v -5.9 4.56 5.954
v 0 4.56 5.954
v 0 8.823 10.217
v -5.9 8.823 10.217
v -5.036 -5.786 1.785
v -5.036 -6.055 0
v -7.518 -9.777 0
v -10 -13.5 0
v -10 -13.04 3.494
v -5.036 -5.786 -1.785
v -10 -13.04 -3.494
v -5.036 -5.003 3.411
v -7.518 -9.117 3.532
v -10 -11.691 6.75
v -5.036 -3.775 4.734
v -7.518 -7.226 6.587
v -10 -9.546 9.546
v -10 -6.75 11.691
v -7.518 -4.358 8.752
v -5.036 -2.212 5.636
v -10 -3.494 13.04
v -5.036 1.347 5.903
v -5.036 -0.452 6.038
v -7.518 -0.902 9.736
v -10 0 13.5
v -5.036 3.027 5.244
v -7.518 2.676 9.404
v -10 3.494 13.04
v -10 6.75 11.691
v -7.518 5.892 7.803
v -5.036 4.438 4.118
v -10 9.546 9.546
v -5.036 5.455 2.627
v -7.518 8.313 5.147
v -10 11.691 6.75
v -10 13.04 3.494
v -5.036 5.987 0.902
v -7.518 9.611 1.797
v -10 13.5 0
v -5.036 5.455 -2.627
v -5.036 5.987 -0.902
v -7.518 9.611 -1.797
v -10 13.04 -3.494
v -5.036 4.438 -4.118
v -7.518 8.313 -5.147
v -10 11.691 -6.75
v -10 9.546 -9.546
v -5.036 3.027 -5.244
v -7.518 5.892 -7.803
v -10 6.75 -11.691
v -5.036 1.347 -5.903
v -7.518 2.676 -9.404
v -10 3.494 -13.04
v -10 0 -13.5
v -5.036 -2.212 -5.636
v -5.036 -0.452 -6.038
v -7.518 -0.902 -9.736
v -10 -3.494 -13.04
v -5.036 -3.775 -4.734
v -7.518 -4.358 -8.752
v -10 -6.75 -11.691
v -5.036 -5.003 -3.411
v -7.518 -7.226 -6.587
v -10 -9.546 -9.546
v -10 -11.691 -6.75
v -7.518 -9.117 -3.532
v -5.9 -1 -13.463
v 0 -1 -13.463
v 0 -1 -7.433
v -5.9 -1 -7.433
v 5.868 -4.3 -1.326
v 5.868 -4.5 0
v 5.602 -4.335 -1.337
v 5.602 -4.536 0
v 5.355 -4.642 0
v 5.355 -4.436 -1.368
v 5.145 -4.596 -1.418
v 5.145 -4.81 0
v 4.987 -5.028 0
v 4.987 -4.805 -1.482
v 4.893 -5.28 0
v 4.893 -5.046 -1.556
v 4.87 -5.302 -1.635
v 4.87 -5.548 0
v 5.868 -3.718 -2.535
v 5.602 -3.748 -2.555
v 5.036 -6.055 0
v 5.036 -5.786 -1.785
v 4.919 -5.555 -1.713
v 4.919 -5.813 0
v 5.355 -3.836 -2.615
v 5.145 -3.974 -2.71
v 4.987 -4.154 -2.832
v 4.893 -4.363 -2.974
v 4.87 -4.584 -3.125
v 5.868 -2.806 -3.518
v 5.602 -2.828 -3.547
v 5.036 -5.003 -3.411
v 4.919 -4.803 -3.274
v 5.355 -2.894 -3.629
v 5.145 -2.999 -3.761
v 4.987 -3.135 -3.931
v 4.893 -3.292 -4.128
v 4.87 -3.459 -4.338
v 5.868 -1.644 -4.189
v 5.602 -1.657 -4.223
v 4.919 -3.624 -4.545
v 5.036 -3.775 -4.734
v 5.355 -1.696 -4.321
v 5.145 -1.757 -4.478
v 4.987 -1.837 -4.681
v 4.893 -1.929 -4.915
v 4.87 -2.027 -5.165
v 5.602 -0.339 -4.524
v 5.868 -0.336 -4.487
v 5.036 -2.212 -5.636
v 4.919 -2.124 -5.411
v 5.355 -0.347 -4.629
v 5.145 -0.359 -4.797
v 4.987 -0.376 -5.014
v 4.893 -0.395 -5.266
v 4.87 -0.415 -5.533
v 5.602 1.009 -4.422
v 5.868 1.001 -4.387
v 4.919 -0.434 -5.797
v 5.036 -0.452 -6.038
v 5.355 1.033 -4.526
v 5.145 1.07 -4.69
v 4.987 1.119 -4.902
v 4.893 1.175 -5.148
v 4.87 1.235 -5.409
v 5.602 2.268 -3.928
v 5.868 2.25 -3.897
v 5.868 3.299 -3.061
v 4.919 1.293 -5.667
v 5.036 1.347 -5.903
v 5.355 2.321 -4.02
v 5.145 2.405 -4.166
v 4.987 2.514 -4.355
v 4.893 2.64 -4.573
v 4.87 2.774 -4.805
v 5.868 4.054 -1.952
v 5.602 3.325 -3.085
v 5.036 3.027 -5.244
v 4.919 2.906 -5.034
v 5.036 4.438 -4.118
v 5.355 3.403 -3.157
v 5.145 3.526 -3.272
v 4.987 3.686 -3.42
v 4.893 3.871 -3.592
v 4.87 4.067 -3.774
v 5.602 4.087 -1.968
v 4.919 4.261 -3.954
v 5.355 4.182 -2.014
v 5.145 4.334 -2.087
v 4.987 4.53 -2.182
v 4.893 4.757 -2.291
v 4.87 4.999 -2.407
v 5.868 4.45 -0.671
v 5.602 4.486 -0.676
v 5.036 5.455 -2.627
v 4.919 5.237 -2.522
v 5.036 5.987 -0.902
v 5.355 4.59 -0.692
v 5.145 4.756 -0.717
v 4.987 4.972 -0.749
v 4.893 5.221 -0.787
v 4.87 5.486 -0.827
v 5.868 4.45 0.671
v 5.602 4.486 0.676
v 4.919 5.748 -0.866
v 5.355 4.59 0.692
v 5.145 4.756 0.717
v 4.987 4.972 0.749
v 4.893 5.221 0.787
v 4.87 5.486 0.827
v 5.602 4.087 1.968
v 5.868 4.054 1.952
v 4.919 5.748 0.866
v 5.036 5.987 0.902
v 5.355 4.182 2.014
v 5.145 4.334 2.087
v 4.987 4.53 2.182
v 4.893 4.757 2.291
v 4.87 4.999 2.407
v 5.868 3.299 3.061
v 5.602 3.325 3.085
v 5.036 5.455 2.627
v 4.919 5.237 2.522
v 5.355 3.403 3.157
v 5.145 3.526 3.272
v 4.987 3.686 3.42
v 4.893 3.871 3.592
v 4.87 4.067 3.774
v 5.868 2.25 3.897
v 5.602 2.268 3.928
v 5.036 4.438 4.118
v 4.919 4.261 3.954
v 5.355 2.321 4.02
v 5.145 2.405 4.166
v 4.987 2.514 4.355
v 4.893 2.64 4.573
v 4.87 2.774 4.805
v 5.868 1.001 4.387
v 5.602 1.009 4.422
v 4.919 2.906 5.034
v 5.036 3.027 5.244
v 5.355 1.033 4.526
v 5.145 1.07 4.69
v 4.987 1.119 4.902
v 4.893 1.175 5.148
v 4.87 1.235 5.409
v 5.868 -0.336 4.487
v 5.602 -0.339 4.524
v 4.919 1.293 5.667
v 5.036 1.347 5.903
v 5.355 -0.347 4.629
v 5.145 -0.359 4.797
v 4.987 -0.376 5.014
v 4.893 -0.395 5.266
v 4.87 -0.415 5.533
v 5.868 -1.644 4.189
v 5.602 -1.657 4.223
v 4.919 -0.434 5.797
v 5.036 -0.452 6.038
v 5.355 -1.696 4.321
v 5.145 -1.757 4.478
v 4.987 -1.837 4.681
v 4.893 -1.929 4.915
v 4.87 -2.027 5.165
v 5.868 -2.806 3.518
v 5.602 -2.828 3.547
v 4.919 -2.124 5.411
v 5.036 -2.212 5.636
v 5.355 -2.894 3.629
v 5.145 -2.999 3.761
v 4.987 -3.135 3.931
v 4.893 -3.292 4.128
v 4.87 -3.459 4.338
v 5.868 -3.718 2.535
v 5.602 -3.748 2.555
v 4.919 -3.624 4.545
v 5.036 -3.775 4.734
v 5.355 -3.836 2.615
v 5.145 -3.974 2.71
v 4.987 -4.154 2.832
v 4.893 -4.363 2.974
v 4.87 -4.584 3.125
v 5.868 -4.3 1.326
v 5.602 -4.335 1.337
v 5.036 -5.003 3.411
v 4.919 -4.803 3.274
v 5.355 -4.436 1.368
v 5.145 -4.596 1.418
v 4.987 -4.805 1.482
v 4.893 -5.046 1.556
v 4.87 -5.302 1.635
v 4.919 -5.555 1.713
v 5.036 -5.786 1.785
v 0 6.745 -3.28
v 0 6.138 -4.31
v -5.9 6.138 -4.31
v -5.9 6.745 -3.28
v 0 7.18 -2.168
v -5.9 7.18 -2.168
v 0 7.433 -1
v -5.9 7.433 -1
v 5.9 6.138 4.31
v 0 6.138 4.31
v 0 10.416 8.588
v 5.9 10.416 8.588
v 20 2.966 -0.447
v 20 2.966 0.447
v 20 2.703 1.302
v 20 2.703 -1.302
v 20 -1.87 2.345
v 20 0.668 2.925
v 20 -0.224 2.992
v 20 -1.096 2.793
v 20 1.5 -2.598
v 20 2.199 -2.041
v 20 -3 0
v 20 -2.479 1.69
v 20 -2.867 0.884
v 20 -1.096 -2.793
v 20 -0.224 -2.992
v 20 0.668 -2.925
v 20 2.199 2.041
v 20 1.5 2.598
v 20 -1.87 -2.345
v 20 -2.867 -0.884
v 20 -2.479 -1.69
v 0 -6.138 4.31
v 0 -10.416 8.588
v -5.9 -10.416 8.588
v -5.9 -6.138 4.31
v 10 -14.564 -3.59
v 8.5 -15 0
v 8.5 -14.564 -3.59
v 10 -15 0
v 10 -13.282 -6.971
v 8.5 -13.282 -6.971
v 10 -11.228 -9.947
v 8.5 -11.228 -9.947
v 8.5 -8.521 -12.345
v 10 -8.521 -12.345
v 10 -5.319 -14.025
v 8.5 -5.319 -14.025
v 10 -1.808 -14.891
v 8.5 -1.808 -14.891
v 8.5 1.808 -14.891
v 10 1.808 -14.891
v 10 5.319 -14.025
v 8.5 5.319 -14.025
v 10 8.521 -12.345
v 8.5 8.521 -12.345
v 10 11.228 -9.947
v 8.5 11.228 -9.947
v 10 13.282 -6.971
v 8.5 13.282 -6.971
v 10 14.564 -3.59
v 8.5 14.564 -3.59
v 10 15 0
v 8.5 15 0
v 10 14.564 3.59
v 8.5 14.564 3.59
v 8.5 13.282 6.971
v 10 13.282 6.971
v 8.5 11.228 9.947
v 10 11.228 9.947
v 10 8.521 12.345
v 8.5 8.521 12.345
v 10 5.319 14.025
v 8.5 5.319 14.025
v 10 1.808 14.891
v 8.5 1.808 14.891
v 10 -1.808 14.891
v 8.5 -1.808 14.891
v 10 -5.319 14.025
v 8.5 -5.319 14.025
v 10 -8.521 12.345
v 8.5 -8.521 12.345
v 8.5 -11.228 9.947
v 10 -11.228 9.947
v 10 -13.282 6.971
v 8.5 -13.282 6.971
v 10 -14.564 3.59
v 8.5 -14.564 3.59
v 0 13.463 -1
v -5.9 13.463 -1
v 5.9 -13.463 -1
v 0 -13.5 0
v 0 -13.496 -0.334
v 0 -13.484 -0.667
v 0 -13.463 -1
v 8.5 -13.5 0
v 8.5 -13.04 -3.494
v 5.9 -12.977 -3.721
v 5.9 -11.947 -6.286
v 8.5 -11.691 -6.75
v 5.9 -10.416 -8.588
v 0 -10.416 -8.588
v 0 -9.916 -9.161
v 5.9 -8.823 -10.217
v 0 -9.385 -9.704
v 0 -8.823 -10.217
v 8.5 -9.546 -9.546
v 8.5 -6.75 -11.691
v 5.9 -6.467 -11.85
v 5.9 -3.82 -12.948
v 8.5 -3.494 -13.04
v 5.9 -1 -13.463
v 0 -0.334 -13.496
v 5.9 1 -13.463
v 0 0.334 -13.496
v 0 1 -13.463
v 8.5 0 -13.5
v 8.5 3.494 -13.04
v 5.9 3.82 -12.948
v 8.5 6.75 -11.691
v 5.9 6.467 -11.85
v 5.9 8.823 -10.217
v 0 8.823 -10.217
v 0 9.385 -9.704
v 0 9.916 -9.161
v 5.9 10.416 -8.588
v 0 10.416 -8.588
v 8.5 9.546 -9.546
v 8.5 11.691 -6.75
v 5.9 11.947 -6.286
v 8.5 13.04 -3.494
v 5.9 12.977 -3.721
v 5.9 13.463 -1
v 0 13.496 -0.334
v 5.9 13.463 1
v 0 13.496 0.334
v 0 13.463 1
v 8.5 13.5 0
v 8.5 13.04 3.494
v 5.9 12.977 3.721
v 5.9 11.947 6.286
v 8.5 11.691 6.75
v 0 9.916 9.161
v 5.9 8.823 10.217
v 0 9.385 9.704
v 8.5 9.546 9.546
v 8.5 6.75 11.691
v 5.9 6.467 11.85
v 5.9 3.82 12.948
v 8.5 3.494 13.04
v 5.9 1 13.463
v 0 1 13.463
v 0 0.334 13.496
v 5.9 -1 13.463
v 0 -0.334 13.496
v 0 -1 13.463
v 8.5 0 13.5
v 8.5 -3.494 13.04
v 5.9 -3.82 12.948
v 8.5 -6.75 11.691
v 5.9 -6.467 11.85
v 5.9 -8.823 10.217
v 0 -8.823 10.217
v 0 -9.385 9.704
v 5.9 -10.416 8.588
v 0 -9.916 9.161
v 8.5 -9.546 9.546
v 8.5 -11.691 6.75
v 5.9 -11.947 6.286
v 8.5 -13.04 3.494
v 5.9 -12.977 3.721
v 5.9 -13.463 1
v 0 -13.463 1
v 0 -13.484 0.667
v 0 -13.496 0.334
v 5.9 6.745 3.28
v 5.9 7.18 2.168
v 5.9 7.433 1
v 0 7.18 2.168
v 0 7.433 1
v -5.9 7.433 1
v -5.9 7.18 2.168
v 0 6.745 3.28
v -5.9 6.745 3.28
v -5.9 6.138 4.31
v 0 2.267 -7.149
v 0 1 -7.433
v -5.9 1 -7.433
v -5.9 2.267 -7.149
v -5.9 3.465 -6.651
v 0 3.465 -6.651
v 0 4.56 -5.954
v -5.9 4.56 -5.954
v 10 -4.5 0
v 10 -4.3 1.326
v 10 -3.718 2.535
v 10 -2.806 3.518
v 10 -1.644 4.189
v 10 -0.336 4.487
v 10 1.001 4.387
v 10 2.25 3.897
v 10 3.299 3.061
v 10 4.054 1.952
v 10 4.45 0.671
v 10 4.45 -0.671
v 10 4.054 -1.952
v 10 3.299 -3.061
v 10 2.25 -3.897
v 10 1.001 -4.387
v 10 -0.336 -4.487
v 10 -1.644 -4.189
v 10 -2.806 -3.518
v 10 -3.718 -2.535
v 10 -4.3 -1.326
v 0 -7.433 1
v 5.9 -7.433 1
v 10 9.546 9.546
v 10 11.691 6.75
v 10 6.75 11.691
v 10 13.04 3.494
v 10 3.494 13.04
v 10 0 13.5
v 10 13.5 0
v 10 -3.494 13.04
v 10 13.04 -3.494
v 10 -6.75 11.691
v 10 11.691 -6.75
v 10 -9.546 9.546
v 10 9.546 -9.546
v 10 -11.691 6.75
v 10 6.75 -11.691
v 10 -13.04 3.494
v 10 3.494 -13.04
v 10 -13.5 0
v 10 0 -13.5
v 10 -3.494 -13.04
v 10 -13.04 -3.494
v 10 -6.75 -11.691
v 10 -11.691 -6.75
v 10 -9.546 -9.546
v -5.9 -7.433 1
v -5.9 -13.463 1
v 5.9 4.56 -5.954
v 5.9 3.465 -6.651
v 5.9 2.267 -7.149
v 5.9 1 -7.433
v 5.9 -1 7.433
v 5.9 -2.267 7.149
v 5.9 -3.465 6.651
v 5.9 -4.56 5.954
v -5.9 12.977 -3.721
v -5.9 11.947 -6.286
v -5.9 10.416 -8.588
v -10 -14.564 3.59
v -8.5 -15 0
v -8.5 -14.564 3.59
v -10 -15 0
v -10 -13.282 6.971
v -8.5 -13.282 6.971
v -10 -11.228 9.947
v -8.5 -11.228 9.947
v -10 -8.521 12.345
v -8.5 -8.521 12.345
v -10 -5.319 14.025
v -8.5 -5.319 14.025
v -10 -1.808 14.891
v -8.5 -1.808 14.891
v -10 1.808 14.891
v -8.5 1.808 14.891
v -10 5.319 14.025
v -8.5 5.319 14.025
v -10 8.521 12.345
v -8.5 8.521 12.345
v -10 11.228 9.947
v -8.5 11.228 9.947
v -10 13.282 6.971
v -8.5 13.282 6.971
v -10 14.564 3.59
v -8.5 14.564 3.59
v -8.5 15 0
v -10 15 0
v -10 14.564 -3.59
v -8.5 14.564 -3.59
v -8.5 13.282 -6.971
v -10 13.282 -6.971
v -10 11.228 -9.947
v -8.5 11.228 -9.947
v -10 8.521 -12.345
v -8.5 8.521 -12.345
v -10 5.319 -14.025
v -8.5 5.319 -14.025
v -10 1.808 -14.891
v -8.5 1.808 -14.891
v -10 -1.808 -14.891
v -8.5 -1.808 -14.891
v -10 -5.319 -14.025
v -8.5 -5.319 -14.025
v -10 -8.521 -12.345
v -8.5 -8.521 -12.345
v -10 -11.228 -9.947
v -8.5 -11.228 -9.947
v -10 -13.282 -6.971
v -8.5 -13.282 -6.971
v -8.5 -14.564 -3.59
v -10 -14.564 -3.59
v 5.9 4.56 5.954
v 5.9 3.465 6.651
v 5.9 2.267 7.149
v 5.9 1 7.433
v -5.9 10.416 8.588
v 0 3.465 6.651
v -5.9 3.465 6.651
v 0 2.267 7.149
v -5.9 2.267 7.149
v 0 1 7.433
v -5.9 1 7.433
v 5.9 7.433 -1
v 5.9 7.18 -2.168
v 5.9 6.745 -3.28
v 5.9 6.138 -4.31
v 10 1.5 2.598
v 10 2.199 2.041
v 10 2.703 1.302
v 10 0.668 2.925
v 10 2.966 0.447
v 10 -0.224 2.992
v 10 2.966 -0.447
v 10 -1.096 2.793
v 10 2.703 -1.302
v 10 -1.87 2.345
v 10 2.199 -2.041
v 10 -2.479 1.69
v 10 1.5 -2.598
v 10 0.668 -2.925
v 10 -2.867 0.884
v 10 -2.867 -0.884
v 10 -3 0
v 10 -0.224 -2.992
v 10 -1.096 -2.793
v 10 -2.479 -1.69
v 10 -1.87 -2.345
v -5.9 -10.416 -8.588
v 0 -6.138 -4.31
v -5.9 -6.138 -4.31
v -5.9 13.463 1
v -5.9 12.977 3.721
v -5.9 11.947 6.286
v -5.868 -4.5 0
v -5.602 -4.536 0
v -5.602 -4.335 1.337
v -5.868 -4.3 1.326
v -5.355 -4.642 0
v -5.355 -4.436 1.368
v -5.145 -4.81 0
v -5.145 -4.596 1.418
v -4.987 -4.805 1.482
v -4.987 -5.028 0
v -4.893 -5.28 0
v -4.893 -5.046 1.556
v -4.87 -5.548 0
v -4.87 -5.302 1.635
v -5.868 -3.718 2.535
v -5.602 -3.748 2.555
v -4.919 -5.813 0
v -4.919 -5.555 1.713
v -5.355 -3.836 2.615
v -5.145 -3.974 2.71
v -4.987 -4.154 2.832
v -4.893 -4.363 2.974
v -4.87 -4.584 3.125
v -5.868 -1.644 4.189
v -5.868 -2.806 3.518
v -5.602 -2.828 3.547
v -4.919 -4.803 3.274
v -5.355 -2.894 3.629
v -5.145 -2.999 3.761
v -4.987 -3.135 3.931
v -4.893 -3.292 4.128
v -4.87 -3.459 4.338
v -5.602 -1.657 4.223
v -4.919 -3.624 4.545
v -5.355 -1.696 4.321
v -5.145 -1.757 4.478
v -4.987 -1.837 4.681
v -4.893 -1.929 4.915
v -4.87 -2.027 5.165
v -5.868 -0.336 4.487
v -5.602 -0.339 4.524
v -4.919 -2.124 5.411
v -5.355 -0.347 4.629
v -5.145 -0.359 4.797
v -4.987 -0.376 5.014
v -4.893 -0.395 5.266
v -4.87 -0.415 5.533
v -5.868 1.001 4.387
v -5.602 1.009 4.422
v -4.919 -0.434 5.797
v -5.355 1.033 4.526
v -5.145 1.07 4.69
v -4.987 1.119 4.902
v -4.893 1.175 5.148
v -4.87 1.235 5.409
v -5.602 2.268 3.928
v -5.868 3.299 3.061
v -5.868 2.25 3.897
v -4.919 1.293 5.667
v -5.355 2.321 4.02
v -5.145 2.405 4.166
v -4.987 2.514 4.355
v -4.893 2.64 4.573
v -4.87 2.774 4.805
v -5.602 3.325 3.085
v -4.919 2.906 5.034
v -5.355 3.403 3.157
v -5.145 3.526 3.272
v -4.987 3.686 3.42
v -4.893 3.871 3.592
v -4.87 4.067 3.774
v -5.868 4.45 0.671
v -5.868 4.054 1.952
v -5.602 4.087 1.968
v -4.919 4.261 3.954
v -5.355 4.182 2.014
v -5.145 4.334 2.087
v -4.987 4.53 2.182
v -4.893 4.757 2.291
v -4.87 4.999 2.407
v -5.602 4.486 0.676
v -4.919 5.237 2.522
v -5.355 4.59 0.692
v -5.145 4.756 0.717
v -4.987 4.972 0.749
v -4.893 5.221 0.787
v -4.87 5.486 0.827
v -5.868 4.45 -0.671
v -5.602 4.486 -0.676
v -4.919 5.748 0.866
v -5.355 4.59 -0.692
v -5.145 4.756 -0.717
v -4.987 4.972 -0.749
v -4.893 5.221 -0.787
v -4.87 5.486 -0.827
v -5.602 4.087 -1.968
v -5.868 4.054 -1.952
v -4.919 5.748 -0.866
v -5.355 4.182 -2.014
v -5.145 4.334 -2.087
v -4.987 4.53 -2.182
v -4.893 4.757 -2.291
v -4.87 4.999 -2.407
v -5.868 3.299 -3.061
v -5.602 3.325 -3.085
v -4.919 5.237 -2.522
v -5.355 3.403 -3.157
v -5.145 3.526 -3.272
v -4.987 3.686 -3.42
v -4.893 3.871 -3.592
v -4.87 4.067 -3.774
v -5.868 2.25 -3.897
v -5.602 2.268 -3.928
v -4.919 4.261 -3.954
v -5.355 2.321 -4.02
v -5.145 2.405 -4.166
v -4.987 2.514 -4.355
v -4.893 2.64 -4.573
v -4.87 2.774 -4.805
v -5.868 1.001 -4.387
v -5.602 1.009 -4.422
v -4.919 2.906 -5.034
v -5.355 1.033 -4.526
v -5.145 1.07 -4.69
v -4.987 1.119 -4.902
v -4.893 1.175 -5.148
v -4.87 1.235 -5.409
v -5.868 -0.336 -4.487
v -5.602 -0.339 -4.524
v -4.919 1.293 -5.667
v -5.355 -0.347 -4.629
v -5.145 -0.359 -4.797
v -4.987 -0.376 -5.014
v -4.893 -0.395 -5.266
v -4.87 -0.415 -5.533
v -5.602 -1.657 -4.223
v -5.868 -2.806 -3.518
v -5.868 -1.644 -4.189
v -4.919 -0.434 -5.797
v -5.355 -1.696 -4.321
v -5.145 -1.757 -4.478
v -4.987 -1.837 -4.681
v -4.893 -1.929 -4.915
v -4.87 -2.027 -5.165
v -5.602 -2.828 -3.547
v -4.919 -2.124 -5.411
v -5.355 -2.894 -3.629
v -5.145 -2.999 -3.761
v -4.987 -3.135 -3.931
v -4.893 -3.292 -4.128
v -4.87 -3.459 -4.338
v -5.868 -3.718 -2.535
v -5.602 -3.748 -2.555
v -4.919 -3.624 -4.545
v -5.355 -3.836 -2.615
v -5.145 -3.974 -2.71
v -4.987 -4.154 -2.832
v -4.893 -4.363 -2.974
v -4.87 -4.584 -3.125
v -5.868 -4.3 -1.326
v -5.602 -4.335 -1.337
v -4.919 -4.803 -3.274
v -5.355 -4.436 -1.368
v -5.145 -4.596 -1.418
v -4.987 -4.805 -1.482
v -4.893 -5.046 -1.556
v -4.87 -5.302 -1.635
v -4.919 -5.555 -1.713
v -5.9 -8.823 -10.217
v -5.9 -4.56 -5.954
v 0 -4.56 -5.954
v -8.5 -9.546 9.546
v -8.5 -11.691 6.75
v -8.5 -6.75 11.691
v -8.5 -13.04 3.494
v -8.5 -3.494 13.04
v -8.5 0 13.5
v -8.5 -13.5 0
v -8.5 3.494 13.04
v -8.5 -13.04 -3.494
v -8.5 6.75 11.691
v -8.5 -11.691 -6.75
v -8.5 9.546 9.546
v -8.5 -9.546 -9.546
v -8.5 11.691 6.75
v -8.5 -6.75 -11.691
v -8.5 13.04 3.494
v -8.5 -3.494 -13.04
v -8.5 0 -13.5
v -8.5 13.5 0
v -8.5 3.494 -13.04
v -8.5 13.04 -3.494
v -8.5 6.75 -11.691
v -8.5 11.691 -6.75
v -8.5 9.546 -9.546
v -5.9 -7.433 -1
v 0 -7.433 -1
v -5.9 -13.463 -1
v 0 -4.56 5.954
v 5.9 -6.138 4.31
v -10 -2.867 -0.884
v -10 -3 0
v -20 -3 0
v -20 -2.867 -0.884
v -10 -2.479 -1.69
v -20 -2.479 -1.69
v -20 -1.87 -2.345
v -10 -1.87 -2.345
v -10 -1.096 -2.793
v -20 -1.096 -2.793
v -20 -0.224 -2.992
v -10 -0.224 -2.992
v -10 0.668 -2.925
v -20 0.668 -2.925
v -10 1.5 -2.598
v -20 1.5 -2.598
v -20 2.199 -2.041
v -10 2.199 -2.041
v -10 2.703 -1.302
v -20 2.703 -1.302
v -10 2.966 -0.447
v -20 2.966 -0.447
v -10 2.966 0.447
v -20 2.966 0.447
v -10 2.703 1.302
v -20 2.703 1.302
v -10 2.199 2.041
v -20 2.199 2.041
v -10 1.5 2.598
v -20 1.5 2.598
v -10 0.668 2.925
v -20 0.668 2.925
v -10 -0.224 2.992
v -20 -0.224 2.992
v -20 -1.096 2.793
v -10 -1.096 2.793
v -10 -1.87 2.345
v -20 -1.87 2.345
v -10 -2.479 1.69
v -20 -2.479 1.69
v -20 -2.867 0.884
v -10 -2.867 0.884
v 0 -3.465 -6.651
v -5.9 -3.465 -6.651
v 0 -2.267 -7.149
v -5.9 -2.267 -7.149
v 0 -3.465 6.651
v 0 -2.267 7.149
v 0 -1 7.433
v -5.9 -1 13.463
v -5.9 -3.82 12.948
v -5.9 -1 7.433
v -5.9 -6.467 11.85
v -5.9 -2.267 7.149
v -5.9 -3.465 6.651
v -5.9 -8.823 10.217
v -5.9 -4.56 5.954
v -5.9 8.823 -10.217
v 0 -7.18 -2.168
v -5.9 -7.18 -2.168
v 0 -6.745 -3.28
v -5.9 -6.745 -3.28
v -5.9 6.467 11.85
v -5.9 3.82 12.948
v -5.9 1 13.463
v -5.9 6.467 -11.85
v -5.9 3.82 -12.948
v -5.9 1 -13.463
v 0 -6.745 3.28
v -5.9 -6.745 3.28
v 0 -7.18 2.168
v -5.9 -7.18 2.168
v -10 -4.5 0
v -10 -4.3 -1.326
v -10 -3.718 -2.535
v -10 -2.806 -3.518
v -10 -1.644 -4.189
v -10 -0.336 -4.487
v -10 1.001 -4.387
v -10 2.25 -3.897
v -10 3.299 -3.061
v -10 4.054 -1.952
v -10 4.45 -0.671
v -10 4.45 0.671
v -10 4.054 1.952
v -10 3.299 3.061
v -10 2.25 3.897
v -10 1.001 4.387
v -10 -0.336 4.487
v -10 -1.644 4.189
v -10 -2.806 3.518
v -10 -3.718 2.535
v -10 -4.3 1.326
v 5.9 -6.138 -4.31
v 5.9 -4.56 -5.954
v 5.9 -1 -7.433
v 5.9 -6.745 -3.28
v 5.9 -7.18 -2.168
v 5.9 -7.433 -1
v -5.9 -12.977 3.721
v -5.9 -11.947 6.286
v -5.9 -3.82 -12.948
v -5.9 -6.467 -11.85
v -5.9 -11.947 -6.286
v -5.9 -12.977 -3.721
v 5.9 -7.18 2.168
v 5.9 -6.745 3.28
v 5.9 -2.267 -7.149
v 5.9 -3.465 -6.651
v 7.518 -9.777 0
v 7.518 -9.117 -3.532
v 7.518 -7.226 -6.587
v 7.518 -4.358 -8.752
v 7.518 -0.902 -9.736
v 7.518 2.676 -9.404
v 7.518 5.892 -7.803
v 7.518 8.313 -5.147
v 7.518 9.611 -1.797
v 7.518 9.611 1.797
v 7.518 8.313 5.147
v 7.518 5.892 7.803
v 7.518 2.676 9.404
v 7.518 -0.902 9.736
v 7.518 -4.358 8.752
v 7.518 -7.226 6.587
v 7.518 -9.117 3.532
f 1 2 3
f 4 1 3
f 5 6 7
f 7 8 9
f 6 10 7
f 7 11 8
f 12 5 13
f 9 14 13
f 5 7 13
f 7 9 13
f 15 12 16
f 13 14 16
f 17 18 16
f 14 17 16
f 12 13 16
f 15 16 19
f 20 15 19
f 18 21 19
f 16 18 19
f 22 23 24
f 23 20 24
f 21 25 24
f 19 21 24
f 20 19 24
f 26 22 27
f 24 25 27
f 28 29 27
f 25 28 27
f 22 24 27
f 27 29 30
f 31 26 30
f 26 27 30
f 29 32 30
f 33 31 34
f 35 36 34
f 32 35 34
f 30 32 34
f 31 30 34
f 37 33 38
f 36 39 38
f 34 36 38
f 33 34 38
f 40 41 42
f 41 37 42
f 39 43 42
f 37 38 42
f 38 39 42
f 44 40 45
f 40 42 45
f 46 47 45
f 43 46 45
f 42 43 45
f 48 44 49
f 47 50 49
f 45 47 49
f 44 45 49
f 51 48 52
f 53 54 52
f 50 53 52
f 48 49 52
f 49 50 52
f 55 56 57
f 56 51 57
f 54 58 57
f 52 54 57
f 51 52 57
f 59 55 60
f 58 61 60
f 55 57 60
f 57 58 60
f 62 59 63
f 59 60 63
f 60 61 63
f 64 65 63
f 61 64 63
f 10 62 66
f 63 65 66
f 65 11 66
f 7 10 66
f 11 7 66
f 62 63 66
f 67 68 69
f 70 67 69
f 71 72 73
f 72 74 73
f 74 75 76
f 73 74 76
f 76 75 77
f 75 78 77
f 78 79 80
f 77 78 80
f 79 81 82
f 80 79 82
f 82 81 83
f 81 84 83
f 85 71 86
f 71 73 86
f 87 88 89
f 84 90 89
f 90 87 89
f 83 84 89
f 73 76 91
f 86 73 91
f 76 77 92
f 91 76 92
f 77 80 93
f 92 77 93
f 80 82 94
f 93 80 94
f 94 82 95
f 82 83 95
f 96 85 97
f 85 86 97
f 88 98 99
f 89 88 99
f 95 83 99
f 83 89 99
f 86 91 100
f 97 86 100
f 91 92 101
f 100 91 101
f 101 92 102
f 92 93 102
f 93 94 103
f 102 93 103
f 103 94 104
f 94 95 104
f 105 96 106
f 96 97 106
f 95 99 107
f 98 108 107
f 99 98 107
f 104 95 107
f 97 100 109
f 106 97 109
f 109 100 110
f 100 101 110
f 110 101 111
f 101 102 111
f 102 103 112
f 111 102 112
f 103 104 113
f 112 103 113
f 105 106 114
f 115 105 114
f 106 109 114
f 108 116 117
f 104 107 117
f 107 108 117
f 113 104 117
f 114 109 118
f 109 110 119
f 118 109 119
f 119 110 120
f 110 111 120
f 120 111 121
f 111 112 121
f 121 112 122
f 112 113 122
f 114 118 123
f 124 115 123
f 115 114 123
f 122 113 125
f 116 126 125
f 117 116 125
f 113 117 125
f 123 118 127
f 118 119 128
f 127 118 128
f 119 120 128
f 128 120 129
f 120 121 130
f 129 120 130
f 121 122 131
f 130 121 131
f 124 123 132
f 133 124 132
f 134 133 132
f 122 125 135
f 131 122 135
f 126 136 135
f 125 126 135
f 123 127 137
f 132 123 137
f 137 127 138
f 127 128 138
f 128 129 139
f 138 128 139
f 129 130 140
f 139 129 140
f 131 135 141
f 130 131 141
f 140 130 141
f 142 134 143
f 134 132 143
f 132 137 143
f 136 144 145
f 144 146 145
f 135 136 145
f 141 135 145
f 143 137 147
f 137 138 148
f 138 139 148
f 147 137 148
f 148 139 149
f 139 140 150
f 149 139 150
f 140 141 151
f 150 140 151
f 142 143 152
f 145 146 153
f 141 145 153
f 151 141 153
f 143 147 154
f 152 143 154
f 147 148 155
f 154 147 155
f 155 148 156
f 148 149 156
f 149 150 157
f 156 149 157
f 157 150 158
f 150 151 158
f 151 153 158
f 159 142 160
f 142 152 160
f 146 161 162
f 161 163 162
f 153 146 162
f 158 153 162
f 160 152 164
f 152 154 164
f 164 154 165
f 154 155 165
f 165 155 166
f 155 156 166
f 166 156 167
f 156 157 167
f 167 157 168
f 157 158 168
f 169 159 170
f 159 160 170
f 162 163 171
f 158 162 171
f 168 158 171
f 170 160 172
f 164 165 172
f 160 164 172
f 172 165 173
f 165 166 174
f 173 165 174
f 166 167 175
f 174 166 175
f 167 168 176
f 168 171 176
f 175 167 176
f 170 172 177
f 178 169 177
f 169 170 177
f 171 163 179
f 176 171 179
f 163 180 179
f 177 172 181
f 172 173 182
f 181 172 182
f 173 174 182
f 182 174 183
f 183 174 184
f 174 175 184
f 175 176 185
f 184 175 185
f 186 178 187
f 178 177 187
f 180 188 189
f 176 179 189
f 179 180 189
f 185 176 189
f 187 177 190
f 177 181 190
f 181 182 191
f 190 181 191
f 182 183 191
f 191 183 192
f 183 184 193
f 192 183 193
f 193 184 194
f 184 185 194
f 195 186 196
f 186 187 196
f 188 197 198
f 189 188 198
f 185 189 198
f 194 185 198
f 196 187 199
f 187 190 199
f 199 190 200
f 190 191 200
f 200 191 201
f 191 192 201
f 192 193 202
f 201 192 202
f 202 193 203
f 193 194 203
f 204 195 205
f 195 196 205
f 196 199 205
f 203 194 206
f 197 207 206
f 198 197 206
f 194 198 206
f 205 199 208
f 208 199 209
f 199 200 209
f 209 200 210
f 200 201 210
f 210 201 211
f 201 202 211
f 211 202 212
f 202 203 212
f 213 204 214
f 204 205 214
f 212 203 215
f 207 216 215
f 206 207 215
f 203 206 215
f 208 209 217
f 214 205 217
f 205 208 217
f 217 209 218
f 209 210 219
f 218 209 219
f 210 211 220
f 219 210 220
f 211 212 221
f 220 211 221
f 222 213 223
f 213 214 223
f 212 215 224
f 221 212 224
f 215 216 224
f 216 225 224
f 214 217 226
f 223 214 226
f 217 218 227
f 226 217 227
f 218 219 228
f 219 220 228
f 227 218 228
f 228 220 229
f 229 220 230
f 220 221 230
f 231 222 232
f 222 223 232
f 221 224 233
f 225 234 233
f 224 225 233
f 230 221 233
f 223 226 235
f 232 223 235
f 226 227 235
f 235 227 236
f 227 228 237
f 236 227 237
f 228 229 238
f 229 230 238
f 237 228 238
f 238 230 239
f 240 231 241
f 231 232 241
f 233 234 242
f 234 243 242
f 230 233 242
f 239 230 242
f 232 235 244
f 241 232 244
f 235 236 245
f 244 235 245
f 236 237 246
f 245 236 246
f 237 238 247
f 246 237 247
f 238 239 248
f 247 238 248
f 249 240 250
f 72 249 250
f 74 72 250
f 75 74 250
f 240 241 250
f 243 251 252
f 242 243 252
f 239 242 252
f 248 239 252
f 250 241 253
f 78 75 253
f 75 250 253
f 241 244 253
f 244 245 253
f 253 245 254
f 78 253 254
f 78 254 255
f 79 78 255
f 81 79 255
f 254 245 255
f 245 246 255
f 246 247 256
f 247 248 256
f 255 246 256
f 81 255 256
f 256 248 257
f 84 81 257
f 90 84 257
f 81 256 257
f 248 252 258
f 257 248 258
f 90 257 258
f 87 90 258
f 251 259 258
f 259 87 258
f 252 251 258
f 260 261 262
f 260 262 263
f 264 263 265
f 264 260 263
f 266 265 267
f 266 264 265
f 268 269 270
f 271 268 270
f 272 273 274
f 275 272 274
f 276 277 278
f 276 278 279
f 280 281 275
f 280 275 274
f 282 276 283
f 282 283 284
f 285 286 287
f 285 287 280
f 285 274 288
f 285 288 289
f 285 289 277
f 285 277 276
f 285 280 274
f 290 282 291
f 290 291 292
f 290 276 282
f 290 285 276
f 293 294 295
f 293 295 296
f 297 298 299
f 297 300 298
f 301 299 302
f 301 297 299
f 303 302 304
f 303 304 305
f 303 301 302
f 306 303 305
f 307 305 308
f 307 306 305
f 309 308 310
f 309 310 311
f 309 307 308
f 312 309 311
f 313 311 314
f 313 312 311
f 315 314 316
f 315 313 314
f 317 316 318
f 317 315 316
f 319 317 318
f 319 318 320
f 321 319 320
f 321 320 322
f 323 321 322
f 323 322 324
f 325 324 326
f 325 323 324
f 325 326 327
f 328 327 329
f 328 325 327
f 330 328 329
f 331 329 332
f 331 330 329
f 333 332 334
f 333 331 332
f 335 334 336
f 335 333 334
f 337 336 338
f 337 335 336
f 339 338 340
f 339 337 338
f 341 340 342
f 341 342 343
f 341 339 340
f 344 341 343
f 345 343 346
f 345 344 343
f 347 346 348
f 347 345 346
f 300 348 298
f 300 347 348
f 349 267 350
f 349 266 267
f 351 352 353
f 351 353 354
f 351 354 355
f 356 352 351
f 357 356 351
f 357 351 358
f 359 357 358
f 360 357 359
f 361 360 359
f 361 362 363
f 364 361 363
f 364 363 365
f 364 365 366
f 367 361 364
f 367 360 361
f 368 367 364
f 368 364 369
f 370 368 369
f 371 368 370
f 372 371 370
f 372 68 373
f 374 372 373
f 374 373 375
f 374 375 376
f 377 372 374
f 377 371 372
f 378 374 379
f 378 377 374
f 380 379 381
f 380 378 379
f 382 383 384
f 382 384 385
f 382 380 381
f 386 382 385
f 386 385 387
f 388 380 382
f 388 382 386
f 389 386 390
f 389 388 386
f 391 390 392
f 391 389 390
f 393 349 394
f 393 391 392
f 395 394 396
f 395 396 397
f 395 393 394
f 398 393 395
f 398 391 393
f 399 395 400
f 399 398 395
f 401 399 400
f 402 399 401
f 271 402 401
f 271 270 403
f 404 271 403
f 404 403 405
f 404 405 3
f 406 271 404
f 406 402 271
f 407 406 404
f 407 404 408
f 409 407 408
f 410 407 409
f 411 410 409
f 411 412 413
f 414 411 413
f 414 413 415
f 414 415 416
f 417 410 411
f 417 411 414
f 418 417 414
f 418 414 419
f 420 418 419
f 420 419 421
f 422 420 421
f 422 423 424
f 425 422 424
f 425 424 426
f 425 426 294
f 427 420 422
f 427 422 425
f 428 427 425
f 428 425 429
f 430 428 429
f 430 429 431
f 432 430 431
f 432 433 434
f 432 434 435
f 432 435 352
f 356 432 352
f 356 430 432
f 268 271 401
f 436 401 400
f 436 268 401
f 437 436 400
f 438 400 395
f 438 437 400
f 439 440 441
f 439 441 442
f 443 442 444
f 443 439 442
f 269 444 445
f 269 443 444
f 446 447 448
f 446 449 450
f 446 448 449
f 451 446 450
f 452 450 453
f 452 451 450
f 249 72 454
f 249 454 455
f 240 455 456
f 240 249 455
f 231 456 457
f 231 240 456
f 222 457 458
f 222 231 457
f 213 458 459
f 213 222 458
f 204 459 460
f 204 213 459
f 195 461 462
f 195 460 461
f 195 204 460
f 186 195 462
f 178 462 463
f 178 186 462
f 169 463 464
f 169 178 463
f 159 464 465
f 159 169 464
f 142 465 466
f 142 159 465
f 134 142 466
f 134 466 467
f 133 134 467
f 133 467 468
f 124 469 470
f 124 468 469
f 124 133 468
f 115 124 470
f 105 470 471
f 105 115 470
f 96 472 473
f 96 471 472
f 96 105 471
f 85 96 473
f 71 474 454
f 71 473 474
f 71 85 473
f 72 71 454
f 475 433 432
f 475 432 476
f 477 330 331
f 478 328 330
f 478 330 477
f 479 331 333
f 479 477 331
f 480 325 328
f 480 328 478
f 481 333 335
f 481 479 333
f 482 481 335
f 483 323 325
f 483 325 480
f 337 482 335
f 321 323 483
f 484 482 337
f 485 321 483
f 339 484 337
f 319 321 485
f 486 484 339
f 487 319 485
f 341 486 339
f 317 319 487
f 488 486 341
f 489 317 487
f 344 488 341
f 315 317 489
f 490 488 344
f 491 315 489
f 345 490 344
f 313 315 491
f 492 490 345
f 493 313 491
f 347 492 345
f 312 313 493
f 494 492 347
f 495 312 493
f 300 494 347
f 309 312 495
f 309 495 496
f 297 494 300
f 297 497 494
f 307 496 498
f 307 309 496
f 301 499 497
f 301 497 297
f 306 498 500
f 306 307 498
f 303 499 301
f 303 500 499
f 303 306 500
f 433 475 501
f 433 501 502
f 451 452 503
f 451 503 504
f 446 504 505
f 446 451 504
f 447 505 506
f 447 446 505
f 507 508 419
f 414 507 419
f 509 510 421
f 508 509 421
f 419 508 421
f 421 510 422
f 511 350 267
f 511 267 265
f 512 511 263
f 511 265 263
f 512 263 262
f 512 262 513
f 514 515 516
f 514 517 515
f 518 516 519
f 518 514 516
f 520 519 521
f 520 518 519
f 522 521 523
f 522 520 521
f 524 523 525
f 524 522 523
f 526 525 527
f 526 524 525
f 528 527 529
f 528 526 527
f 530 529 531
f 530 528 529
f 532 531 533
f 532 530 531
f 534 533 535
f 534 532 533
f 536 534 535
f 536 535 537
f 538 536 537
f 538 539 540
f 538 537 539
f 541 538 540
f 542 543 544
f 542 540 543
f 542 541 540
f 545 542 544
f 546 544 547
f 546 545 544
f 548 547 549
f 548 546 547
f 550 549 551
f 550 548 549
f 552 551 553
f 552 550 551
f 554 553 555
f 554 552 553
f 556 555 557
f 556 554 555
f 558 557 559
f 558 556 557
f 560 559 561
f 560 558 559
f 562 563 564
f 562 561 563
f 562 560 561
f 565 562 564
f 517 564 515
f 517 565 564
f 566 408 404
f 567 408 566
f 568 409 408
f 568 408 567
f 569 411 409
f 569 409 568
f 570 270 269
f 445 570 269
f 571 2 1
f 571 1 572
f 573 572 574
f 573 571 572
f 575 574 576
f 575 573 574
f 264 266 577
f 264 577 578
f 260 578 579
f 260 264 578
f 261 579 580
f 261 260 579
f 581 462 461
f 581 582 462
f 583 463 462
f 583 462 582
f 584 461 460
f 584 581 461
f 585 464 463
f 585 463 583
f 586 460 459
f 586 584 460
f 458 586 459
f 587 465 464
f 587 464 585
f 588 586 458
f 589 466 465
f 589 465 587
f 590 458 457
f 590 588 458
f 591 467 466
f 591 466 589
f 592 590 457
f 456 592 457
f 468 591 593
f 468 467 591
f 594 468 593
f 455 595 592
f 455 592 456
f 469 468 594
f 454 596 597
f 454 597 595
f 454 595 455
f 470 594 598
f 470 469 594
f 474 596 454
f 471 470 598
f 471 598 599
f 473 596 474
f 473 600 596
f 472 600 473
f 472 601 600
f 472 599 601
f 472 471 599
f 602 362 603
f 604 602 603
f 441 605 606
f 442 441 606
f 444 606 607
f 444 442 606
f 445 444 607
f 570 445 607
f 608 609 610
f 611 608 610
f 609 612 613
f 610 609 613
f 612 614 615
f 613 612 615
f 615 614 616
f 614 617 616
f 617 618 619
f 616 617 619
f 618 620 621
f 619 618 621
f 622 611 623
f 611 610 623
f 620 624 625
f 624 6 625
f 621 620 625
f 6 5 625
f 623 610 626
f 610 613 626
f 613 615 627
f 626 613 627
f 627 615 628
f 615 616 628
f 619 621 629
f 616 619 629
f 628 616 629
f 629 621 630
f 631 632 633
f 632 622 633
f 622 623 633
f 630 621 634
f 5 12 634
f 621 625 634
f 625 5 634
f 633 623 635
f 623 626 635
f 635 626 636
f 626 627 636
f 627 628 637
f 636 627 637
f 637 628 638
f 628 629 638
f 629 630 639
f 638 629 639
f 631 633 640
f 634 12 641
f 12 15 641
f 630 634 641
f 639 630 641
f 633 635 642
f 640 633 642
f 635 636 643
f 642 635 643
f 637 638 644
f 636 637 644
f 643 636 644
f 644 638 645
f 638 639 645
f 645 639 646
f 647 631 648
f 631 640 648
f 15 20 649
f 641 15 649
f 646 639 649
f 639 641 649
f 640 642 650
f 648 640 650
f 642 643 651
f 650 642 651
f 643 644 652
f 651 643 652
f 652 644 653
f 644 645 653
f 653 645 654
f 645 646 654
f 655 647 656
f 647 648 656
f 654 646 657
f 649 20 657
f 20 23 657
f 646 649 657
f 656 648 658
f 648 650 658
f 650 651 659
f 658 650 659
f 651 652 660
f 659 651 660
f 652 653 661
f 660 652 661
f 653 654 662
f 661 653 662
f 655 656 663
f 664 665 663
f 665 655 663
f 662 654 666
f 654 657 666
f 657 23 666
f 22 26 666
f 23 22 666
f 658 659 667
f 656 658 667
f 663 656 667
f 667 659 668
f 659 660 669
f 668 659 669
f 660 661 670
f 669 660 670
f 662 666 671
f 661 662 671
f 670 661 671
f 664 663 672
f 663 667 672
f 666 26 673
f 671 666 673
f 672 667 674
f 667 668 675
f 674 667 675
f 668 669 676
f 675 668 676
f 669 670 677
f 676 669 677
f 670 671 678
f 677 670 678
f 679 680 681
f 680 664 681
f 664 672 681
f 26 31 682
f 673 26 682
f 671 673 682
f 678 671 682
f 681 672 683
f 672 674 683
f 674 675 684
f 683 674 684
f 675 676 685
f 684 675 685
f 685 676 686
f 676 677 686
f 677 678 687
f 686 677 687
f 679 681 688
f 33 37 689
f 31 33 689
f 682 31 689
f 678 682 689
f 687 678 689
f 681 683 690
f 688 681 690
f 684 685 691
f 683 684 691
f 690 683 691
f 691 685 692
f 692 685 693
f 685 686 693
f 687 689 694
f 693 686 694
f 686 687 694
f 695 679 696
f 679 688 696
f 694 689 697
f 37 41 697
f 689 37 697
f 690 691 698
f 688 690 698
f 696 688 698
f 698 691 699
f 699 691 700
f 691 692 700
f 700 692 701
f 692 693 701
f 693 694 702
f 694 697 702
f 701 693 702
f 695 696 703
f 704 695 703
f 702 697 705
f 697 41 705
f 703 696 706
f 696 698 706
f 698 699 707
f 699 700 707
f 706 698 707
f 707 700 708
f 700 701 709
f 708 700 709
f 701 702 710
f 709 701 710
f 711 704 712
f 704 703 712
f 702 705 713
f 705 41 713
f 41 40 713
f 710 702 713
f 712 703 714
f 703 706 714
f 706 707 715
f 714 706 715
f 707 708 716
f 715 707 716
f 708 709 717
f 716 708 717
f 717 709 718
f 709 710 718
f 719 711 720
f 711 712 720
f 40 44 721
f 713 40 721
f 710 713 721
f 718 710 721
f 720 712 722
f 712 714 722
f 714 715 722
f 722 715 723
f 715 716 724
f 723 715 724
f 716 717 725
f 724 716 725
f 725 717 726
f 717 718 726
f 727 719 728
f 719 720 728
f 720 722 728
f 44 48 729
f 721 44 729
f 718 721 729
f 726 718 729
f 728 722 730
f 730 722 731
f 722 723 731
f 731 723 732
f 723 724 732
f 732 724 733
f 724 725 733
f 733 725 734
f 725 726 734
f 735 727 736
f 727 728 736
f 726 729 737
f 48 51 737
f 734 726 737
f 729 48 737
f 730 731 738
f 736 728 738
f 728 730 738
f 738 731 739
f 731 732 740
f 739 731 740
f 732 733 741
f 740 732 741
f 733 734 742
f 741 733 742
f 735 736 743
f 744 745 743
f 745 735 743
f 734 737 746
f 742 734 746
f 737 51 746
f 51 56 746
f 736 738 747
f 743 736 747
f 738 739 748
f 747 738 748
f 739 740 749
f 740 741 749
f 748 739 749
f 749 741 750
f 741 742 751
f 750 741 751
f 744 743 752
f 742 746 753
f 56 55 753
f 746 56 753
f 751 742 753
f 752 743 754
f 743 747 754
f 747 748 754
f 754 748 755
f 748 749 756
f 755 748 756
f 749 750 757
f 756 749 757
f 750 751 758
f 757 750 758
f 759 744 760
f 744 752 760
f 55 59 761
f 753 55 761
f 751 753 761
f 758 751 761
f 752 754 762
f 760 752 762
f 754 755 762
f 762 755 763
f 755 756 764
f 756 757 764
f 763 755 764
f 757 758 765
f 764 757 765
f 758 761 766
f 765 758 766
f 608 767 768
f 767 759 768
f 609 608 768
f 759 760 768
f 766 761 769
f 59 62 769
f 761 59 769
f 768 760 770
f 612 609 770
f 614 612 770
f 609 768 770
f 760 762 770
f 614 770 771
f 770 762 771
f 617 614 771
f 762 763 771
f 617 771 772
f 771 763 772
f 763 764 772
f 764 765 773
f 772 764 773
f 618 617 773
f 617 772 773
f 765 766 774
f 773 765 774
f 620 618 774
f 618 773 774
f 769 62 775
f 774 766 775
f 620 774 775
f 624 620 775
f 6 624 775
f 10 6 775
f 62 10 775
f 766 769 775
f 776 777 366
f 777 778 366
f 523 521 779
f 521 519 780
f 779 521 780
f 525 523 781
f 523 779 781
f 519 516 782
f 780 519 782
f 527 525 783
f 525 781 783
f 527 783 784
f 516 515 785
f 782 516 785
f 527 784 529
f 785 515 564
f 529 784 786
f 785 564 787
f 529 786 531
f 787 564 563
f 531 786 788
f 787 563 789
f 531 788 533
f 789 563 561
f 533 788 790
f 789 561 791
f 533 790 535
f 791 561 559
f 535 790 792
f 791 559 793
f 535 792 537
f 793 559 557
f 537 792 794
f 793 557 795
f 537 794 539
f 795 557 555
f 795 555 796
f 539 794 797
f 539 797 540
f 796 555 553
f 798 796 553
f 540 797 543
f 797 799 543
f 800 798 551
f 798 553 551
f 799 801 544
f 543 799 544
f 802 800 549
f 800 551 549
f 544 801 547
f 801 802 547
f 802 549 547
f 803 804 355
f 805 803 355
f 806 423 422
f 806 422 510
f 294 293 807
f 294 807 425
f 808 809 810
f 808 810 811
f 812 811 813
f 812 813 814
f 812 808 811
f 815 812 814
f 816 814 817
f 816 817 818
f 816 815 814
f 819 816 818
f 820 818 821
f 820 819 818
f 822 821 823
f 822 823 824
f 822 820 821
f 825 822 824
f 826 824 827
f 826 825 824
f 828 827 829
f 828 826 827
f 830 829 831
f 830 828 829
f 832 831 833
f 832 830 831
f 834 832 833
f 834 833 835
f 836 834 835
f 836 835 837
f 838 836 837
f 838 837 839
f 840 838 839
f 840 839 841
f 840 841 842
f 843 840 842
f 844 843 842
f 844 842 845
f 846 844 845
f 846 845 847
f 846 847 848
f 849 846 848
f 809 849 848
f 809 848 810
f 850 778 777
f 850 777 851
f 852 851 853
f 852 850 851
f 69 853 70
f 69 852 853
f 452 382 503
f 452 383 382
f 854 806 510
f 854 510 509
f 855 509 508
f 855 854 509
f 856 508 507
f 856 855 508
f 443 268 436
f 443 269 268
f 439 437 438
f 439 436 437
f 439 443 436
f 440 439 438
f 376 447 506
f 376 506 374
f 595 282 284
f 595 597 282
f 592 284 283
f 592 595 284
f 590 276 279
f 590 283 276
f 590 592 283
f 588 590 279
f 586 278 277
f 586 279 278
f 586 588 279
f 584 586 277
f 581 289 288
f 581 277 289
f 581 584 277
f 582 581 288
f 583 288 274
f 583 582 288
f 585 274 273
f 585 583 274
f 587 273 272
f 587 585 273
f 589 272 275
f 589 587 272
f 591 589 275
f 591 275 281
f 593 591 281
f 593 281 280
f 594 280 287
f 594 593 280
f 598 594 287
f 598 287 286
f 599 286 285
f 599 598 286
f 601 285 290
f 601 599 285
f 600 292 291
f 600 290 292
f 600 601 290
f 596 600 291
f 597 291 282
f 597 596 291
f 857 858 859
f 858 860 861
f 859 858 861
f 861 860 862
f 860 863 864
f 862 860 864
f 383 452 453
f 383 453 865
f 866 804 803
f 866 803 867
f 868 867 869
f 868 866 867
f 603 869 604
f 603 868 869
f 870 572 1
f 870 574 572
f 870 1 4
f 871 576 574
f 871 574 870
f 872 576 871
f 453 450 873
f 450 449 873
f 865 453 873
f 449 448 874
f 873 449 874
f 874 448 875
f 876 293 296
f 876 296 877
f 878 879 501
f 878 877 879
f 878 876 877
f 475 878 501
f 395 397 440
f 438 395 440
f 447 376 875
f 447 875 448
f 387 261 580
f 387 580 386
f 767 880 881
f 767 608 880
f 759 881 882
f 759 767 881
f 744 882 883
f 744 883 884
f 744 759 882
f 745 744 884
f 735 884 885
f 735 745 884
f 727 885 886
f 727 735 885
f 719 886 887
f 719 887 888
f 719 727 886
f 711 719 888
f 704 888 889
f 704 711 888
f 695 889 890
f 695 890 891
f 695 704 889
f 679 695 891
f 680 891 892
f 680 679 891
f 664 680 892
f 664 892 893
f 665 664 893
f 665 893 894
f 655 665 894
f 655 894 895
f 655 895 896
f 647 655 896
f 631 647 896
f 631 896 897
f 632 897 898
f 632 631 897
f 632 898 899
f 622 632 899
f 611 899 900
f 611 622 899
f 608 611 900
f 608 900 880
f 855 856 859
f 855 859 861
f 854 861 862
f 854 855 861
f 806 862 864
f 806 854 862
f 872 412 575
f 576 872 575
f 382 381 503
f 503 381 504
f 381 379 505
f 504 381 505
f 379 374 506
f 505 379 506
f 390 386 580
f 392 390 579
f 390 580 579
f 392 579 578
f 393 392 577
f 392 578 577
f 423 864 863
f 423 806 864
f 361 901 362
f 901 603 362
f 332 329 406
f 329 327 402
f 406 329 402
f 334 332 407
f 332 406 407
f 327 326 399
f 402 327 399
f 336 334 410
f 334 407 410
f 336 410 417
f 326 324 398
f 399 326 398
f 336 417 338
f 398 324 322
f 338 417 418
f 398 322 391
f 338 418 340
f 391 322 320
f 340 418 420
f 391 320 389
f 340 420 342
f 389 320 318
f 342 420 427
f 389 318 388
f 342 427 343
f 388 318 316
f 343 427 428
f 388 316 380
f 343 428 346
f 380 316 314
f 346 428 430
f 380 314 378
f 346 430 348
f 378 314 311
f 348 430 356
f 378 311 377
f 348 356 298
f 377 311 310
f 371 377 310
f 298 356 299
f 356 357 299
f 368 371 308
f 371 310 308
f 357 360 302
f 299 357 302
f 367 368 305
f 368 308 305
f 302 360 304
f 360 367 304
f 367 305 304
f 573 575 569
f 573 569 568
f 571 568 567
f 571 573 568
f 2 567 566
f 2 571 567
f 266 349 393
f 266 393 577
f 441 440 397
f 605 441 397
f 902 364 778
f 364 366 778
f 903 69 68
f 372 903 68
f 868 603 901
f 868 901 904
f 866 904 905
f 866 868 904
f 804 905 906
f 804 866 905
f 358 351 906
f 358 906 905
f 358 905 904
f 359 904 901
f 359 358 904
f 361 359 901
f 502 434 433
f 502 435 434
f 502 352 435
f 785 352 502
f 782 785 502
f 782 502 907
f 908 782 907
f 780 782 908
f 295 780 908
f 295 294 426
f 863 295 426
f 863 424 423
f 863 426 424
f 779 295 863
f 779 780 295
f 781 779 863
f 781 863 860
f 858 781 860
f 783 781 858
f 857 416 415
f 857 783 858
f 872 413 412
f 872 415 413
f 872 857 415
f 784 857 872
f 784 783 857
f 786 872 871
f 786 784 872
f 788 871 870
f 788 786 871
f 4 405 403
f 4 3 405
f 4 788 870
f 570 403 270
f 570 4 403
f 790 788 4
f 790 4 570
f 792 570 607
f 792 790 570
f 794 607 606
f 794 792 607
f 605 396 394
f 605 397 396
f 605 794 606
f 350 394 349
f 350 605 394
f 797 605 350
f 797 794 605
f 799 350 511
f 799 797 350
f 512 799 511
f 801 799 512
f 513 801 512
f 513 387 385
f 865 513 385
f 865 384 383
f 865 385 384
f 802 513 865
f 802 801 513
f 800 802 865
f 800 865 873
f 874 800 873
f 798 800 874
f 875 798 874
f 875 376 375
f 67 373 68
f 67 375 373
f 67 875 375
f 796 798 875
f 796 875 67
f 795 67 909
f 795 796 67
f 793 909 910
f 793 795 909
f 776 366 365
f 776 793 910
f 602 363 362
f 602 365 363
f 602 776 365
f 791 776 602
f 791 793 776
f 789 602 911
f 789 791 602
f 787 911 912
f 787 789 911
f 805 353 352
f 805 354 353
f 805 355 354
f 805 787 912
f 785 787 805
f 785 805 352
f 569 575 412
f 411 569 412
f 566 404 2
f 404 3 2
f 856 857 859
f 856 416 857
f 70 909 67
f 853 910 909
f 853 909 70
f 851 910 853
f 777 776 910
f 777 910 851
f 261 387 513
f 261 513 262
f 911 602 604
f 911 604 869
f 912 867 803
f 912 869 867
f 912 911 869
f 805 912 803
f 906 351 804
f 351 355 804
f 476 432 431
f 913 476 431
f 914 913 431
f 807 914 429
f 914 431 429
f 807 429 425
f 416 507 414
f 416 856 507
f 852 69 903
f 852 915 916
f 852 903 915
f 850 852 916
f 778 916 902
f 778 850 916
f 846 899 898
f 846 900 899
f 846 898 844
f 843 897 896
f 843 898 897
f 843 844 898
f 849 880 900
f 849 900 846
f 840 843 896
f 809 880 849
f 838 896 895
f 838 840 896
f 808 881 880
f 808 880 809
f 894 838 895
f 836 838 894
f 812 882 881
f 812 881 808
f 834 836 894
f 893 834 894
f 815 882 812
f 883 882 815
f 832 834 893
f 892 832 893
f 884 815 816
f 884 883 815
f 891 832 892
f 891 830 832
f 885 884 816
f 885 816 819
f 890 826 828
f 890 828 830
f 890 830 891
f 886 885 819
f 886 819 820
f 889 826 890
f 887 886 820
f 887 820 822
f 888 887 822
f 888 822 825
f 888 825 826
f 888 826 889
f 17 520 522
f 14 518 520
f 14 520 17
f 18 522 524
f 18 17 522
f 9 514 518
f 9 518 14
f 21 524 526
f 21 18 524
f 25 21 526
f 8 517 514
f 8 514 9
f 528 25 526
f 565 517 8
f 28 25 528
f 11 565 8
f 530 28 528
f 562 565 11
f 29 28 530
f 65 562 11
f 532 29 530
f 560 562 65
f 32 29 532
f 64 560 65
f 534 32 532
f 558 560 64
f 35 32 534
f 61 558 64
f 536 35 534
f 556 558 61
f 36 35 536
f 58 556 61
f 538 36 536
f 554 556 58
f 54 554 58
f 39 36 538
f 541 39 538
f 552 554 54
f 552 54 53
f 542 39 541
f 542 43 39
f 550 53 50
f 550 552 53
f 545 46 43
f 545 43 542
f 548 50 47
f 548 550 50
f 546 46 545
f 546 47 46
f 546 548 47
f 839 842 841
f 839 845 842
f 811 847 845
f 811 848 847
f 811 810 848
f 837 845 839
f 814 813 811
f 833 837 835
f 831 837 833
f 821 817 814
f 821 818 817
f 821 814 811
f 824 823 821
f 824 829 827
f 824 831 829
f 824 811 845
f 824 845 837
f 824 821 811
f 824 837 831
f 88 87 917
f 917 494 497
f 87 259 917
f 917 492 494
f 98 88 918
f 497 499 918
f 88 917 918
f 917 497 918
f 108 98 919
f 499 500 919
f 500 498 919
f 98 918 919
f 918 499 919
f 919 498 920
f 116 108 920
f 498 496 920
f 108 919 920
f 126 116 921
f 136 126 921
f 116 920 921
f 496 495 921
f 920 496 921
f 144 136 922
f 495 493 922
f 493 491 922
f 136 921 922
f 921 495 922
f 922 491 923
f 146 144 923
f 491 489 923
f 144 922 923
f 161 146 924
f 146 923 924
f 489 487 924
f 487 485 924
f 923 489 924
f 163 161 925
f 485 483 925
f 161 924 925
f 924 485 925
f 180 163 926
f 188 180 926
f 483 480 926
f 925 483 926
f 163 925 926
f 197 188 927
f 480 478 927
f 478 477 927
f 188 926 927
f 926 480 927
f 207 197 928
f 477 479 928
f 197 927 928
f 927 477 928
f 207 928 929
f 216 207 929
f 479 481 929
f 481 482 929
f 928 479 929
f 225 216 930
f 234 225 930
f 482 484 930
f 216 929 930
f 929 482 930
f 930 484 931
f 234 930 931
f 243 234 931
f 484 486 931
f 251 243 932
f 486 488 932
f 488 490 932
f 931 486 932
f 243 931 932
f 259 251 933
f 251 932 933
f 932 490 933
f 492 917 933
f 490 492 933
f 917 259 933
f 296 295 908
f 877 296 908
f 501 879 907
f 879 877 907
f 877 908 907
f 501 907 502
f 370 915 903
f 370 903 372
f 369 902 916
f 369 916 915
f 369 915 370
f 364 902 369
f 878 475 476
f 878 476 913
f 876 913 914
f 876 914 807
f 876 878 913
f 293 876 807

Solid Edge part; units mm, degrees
sketch "Sketch1" plane through (0, 0, 0) normal (0, 0, 1) x (1, 0, 0)
  line L0 (20, -3) -> (10, -3)
  line L1 (10, -3) -> (10, -4.5)
  line L2 (10, -4.5) -> (5.8685, -4.5)
  arc A0 (5.8685, -4.5) -> (5.0365, -6.0547) centre (5.8685, -5.5) ccw
  line L3 (5.0365, -6.0547) -> (10, -13.5)
  line L4 (10, -13.5) -> (10, -15)
  line L5 (8.5, -15) -> (10, -15)
  line L6 (8.5, -13.5) -> (8.5, -15)
  line L7 (0, -13.5) -> (8.5, -13.5)
  line L8 (0, 0) -> (0, -13.5)
  line L9 (0, 0) -> (20, 0)
  line L10 (20, 0) -> (20, -3)
revolve "RevolvedProtrusion1" add sketch "Sketch1" angle 360 about axis through (0, 0, 0) along (1, 0, 0)
sketch "Sketch2" plane through (0, 0, 0) normal (-1, 0, 0) x (0, 0, 1)
  line L0 (-7.433, 1) -> (-19.394, 1)
  line L1 (-19.394, 1) -> (-19.394, 18)
  line L2 (-19.394, 18) -> (-5.9543, 4.5603)
  arc A0 (-5.9543, 4.5603) -> (-7.433, 1) centre (0, 0) ccw
  line L3 (-7.433, -1) -> (-19.394, -1)
  line L4 (-19.394, -1) -> (-19.394, -18)
  line L5 (-19.394, -18) -> (-5.9543, -4.5603)
  arc A1 (-5.9543, -4.5603) -> (-7.433, -1) centre (0, 0) cw
  line L6 (-4.3097, -6.1381) -> (-18, -19.8284)
  line L7 (-18, -19.8284) -> (-1, -19.8284)
  line L8 (-1, -19.8284) -> (-1, -7.433)
  arc A2 (-1, -7.433) -> (-4.3097, -6.1381) centre (0, 0) cw
  line L9 (1, -19.8284) -> (1, -7.433)
  arc A3 (1, -7.433) -> (4.3097, -6.1381) centre (0, 0) ccw
  line L10 (4.3097, -6.1381) -> (18, -19.8284)
  line L11 (18, -19.8284) -> (1, -19.8284)
  line L12 (19.394, -18) -> (5.9543, -4.5603)
  arc A4 (5.9543, -4.5603) -> (7.433, -1) centre (0, 0) ccw
  line L13 (7.433, -1) -> (19.394, -1)
  line L14 (19.394, -1) -> (19.394, -18)
  line L15 (7.433, 1) -> (19.394, 1)
  line L16 (19.394, 1) -> (19.394, 18)
  line L17 (19.394, 18) -> (5.9543, 4.5603)
  arc A5 (5.9543, 4.5603) -> (7.433, 1) centre (0, 0) cw
  line L18 (4.3097, 6.1381) -> (18, 19.8284)
  line L19 (18, 19.8284) -> (1, 19.8284)
  line L20 (1, 19.8284) -> (1, 7.433)
  arc A6 (1, 7.433) -> (4.3097, 6.1381) centre (0, 0) cw
  line L21 (-1, 19.8284) -> (-1, 7.433)
  arc A7 (-1, 7.433) -> (-4.3097, 6.1381) centre (0, 0) ccw
  line L22 (-4.3097, 6.1381) -> (-18, 19.8284)
  line L23 (-18, 19.8284) -> (-1, 19.8284)
extrude "Cutout1" cut sketch "Sketch2" against normal blind 5.9
mirror "Mirror1" about plane through (0, 0, 0) normal (1, 0, 0) of "RevolvedProtrusion1", "Cutout1"
